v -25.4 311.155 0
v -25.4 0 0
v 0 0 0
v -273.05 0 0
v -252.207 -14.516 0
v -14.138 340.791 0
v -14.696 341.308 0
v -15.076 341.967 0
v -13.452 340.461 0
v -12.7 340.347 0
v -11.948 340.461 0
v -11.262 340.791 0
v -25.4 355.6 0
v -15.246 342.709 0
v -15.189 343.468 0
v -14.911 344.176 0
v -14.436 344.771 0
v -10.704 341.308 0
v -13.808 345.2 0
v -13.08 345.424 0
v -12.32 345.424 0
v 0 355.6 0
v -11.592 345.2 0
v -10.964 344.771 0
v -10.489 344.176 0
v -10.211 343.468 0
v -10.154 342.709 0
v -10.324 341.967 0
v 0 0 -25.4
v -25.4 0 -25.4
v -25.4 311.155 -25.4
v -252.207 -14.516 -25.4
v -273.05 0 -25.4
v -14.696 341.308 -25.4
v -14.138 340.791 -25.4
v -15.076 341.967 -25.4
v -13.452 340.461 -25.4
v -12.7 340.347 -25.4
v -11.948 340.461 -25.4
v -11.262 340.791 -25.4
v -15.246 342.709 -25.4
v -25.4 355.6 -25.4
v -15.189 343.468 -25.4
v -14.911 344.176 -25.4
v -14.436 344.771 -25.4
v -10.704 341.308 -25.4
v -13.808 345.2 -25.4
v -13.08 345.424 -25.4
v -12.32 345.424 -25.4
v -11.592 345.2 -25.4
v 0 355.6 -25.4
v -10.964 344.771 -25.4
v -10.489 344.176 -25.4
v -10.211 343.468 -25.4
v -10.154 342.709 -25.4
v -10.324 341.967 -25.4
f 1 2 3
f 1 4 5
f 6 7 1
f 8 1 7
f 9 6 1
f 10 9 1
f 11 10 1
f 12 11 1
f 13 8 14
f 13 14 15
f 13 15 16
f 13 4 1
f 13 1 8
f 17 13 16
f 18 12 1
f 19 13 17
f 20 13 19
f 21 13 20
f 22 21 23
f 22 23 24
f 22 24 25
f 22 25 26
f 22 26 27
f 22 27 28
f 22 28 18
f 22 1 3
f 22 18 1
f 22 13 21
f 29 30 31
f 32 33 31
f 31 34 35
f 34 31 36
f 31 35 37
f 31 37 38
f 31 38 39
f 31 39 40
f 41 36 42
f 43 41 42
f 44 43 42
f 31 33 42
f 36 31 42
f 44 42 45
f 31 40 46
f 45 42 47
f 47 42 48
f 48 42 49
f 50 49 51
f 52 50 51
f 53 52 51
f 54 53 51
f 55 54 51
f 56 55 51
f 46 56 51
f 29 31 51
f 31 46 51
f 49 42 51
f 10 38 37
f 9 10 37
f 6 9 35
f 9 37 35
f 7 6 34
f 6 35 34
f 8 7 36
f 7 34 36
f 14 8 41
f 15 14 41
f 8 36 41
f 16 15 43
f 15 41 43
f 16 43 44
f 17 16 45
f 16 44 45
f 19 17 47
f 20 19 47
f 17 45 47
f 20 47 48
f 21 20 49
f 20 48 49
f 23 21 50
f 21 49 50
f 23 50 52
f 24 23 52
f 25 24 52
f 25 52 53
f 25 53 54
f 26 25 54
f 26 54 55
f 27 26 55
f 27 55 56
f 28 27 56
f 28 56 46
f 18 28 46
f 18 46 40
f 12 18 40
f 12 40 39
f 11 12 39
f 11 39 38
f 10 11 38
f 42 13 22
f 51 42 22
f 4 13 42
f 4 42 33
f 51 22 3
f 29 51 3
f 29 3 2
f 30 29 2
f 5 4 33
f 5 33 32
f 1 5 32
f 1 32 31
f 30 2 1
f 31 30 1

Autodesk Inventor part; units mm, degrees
ref_plane "YZ Plane" through (0, 0, 0) normal (1, 0, 0) x (0, 1, 0)
ref_plane "XZ Plane" through (0, 0, 0) normal (0, 1, 0) x (-1, 0, 0)
ref_plane "XY Plane" through (0, 0, 0) normal (0, 0, 1) x (1, 0, 0)
sketch "Sketch1" plane through (0, 0, 0) normal (0, 0, 1) x (1, 0, 0)
  line L0 (0, 0) -> (-25.4, 0)
  line L1 (-25.4, 0) -> (-25.4, 355.6)
  line L2 (-25.4, 355.6) -> (0, 355.6)
  line L3 (0, 355.6) -> (0, 0)
  line L4 (-25.4, 355.6) -> (-273.05, 0)
  line L5 (-273.05, 0) -> (-252.2066, -14.5159)
  line L6 (-252.2066, -14.5159) -> (-4.5566, 341.0841)
  line L7 (-4.5566, 341.0841) -> (-25.4, 355.6)
  point P0 (-25.4, 311.1551)
  dimension "d0" = 25.4
  dimension "d1" = 355.6
  dimension "d2" = 25.4
  dimension "d3" = 273.05
extrude "Extrusion1" add sketch "Sketch1" against normal blind 25.4
sketch "Sketch2" plane through (0, 0, 0) normal (0, 0, 1) x (1, 0, 0)
  line L0 (0, 355.6) -> (0, 0) construction
  line L1 (0, 0) -> (-25.4, 0) construction
  line L2 (-25.4, 0) -> (-25.4, 311.1551) construction
  line L3 (-25.4, 311.1551) -> (-252.2066, -14.5159) construction
  line L4 (-252.2066, -14.5159) -> (-273.05, 0) construction
  line L5 (-273.05, 0) -> (-25.4, 355.6) construction
  line L6 (-25.4, 355.6) -> (0, 355.6) construction
  point P0 (-12.7, 342.9)
  dimension "d6" = 12.7
  dimension "d7" = 12.7
hole "Hole1" at (-12.7, 342.9, 0) direction (0, 0, -1) diameter 5.1054 end through all clearance for "Flat Head Machine Screw (82)" size "#10" standard "Ansi Unified Screw Threads"
equation "\"d2\" = d0"
equation "\"d7\" = d6"
properties part number "CL6-P1" material "Aluminum 6061"
